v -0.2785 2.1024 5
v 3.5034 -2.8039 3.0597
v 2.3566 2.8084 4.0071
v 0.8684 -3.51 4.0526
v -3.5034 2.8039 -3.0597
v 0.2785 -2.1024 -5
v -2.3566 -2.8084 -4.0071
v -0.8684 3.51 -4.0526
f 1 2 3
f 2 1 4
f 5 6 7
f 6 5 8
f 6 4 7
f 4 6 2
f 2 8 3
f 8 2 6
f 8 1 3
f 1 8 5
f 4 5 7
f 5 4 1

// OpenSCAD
translate([-2.356575, -2.808432, -4.007089])
rotate([10, 20, 15])
cube(size = [2.903078, 5.806156, 8.709234], center = false);
